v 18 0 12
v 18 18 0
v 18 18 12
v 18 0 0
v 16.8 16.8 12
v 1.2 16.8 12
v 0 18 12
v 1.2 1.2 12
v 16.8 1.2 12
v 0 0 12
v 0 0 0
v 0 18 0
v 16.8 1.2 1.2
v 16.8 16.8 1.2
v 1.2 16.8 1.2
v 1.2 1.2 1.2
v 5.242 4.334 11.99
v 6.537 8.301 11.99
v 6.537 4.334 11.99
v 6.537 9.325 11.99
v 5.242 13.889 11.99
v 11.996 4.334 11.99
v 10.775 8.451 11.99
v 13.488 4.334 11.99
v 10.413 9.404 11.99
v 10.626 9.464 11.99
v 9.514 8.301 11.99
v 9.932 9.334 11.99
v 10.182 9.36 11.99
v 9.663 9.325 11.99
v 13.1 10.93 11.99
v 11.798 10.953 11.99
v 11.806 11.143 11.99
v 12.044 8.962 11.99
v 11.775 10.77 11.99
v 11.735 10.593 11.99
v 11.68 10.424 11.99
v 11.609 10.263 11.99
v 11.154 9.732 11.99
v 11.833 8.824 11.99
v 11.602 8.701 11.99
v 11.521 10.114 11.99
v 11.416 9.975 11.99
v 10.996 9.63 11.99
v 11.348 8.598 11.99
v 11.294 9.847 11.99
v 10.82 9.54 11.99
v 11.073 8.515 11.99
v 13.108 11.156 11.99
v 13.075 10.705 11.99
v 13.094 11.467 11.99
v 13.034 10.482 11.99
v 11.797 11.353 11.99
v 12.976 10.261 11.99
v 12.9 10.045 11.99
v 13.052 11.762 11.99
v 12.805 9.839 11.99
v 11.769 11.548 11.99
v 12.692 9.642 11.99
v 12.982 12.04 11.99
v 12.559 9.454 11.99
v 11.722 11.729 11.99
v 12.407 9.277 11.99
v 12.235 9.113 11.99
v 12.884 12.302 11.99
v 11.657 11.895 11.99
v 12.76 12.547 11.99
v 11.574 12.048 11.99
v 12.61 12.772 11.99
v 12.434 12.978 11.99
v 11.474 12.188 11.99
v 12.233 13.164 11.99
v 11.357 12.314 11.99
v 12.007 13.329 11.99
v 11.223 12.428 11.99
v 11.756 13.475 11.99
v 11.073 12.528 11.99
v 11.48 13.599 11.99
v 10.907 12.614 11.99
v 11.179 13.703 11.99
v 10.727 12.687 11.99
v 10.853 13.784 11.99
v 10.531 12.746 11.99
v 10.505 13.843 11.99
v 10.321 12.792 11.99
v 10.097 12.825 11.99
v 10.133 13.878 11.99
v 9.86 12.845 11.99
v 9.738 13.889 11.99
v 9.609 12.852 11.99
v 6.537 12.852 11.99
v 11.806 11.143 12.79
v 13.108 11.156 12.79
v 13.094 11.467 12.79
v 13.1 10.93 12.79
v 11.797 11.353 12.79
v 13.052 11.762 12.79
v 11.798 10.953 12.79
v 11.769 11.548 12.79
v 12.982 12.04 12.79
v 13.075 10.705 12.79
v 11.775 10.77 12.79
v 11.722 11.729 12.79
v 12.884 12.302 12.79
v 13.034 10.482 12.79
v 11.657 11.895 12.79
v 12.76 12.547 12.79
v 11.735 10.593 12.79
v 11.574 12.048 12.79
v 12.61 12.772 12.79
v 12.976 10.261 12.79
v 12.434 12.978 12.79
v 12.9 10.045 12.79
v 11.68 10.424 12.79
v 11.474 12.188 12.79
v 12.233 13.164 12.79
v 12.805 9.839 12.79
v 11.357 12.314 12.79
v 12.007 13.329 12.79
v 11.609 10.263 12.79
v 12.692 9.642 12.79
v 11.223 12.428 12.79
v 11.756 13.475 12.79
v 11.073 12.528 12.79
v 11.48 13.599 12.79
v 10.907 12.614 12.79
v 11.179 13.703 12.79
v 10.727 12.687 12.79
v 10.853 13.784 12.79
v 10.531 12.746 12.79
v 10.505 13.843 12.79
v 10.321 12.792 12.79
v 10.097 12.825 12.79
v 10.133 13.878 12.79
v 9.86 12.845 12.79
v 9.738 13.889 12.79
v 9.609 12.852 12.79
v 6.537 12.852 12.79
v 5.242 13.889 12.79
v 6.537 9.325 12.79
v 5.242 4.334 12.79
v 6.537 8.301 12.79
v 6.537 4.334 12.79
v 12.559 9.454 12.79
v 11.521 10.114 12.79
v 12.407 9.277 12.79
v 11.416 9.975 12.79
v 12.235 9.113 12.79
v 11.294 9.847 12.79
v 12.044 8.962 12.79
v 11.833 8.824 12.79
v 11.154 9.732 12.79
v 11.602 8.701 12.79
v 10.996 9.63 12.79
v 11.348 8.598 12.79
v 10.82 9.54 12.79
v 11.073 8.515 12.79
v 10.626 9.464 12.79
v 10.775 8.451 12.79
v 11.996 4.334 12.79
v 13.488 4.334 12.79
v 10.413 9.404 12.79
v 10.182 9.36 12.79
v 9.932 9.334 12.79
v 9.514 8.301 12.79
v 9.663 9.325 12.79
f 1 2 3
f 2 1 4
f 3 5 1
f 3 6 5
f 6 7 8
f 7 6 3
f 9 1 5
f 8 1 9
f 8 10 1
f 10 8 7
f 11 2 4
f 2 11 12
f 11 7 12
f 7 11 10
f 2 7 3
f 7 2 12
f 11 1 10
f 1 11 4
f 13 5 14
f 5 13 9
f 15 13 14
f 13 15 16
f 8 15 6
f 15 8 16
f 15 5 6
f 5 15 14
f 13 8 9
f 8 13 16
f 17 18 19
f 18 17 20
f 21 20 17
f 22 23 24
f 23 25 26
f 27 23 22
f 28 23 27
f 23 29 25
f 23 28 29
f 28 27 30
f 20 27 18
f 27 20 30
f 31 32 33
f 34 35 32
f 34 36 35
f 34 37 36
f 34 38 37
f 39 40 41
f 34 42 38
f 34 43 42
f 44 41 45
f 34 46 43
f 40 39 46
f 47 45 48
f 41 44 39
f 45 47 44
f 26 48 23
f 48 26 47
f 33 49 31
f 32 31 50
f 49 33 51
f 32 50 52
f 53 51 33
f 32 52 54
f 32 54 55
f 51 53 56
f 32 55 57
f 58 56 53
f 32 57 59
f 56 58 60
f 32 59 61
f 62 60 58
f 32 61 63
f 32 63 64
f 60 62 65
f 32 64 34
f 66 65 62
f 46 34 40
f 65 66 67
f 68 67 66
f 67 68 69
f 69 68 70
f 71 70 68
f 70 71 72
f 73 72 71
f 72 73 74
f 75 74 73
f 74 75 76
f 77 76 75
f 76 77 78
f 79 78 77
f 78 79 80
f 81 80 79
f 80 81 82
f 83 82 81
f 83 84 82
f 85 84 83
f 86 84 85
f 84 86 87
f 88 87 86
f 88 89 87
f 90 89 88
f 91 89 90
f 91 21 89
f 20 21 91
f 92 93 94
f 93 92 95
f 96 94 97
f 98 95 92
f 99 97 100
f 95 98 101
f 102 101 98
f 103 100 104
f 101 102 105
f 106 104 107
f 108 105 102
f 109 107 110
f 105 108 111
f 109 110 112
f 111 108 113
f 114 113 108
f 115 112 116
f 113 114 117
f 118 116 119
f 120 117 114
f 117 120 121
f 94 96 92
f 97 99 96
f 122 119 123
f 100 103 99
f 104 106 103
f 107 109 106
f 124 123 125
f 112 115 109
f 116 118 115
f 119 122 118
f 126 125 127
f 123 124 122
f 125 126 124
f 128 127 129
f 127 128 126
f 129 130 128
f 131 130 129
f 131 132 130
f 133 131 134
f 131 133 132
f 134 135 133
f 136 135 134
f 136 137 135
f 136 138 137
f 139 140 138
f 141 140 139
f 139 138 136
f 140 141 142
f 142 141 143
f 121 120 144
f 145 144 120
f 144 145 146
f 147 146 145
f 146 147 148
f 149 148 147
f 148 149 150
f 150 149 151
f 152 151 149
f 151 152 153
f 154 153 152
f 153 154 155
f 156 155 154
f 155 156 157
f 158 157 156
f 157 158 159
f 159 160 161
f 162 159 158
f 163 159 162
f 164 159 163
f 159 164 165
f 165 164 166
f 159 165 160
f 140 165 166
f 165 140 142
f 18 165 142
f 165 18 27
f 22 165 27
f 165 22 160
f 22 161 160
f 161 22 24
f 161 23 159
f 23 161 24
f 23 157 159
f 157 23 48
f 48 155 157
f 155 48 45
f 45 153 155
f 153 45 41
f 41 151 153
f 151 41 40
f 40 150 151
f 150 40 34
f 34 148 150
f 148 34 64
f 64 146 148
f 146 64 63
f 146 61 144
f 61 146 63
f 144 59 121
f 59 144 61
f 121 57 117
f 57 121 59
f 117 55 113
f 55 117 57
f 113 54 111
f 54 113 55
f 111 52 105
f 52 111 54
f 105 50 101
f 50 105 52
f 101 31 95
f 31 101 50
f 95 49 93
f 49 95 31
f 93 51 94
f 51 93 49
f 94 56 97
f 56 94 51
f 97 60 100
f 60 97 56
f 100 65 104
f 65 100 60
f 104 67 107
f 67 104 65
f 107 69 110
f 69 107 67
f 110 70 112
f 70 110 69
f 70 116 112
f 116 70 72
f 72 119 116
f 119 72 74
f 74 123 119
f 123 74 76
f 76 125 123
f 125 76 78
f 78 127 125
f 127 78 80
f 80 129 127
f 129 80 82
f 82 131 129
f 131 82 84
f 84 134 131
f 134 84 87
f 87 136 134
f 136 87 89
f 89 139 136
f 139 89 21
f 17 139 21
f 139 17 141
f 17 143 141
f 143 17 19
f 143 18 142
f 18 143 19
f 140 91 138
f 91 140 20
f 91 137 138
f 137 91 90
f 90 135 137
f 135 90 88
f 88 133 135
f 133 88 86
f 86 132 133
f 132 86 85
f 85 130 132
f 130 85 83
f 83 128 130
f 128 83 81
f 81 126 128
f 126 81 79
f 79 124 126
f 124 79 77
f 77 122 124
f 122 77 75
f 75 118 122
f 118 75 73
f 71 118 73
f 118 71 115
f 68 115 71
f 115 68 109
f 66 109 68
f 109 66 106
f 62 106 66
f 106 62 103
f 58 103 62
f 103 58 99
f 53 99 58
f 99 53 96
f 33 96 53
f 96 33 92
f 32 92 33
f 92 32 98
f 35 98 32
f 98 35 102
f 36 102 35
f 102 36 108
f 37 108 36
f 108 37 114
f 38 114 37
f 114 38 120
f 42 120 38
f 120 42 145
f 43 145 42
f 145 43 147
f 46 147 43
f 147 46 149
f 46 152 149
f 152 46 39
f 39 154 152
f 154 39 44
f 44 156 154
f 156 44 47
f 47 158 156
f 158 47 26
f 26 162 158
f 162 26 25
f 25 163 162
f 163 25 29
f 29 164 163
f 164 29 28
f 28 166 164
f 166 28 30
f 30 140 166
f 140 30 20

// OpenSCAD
// 01_cube_keycap.scad
// Beginner: A simple 20mm cube keycap with an embossed letter
// Parameters
key_size = 18;     // mm
key_height = 12;   // mm
wall = 1.2;        // mm
letter = "R";      // change to your preferred letter
letter_size = 10;  // mm
letter_raise = 0.8;// mm

module shell(){
  difference(){
    cube([key_size, key_size, key_height], center=false);
    translate([wall, wall, wall])
      cube([key_size-2*wall, key_size-2*wall, key_height], center=false);
  }
}

module emboss(){
  // Emboss letter on top face
  translate([key_size/2, key_size/2, key_height-0.01])
    linear_extrude(height=letter_raise)
      text(letter, size=letter_size, halign="center", valign="center");
}

union(){
  shell();
  emboss();
}
